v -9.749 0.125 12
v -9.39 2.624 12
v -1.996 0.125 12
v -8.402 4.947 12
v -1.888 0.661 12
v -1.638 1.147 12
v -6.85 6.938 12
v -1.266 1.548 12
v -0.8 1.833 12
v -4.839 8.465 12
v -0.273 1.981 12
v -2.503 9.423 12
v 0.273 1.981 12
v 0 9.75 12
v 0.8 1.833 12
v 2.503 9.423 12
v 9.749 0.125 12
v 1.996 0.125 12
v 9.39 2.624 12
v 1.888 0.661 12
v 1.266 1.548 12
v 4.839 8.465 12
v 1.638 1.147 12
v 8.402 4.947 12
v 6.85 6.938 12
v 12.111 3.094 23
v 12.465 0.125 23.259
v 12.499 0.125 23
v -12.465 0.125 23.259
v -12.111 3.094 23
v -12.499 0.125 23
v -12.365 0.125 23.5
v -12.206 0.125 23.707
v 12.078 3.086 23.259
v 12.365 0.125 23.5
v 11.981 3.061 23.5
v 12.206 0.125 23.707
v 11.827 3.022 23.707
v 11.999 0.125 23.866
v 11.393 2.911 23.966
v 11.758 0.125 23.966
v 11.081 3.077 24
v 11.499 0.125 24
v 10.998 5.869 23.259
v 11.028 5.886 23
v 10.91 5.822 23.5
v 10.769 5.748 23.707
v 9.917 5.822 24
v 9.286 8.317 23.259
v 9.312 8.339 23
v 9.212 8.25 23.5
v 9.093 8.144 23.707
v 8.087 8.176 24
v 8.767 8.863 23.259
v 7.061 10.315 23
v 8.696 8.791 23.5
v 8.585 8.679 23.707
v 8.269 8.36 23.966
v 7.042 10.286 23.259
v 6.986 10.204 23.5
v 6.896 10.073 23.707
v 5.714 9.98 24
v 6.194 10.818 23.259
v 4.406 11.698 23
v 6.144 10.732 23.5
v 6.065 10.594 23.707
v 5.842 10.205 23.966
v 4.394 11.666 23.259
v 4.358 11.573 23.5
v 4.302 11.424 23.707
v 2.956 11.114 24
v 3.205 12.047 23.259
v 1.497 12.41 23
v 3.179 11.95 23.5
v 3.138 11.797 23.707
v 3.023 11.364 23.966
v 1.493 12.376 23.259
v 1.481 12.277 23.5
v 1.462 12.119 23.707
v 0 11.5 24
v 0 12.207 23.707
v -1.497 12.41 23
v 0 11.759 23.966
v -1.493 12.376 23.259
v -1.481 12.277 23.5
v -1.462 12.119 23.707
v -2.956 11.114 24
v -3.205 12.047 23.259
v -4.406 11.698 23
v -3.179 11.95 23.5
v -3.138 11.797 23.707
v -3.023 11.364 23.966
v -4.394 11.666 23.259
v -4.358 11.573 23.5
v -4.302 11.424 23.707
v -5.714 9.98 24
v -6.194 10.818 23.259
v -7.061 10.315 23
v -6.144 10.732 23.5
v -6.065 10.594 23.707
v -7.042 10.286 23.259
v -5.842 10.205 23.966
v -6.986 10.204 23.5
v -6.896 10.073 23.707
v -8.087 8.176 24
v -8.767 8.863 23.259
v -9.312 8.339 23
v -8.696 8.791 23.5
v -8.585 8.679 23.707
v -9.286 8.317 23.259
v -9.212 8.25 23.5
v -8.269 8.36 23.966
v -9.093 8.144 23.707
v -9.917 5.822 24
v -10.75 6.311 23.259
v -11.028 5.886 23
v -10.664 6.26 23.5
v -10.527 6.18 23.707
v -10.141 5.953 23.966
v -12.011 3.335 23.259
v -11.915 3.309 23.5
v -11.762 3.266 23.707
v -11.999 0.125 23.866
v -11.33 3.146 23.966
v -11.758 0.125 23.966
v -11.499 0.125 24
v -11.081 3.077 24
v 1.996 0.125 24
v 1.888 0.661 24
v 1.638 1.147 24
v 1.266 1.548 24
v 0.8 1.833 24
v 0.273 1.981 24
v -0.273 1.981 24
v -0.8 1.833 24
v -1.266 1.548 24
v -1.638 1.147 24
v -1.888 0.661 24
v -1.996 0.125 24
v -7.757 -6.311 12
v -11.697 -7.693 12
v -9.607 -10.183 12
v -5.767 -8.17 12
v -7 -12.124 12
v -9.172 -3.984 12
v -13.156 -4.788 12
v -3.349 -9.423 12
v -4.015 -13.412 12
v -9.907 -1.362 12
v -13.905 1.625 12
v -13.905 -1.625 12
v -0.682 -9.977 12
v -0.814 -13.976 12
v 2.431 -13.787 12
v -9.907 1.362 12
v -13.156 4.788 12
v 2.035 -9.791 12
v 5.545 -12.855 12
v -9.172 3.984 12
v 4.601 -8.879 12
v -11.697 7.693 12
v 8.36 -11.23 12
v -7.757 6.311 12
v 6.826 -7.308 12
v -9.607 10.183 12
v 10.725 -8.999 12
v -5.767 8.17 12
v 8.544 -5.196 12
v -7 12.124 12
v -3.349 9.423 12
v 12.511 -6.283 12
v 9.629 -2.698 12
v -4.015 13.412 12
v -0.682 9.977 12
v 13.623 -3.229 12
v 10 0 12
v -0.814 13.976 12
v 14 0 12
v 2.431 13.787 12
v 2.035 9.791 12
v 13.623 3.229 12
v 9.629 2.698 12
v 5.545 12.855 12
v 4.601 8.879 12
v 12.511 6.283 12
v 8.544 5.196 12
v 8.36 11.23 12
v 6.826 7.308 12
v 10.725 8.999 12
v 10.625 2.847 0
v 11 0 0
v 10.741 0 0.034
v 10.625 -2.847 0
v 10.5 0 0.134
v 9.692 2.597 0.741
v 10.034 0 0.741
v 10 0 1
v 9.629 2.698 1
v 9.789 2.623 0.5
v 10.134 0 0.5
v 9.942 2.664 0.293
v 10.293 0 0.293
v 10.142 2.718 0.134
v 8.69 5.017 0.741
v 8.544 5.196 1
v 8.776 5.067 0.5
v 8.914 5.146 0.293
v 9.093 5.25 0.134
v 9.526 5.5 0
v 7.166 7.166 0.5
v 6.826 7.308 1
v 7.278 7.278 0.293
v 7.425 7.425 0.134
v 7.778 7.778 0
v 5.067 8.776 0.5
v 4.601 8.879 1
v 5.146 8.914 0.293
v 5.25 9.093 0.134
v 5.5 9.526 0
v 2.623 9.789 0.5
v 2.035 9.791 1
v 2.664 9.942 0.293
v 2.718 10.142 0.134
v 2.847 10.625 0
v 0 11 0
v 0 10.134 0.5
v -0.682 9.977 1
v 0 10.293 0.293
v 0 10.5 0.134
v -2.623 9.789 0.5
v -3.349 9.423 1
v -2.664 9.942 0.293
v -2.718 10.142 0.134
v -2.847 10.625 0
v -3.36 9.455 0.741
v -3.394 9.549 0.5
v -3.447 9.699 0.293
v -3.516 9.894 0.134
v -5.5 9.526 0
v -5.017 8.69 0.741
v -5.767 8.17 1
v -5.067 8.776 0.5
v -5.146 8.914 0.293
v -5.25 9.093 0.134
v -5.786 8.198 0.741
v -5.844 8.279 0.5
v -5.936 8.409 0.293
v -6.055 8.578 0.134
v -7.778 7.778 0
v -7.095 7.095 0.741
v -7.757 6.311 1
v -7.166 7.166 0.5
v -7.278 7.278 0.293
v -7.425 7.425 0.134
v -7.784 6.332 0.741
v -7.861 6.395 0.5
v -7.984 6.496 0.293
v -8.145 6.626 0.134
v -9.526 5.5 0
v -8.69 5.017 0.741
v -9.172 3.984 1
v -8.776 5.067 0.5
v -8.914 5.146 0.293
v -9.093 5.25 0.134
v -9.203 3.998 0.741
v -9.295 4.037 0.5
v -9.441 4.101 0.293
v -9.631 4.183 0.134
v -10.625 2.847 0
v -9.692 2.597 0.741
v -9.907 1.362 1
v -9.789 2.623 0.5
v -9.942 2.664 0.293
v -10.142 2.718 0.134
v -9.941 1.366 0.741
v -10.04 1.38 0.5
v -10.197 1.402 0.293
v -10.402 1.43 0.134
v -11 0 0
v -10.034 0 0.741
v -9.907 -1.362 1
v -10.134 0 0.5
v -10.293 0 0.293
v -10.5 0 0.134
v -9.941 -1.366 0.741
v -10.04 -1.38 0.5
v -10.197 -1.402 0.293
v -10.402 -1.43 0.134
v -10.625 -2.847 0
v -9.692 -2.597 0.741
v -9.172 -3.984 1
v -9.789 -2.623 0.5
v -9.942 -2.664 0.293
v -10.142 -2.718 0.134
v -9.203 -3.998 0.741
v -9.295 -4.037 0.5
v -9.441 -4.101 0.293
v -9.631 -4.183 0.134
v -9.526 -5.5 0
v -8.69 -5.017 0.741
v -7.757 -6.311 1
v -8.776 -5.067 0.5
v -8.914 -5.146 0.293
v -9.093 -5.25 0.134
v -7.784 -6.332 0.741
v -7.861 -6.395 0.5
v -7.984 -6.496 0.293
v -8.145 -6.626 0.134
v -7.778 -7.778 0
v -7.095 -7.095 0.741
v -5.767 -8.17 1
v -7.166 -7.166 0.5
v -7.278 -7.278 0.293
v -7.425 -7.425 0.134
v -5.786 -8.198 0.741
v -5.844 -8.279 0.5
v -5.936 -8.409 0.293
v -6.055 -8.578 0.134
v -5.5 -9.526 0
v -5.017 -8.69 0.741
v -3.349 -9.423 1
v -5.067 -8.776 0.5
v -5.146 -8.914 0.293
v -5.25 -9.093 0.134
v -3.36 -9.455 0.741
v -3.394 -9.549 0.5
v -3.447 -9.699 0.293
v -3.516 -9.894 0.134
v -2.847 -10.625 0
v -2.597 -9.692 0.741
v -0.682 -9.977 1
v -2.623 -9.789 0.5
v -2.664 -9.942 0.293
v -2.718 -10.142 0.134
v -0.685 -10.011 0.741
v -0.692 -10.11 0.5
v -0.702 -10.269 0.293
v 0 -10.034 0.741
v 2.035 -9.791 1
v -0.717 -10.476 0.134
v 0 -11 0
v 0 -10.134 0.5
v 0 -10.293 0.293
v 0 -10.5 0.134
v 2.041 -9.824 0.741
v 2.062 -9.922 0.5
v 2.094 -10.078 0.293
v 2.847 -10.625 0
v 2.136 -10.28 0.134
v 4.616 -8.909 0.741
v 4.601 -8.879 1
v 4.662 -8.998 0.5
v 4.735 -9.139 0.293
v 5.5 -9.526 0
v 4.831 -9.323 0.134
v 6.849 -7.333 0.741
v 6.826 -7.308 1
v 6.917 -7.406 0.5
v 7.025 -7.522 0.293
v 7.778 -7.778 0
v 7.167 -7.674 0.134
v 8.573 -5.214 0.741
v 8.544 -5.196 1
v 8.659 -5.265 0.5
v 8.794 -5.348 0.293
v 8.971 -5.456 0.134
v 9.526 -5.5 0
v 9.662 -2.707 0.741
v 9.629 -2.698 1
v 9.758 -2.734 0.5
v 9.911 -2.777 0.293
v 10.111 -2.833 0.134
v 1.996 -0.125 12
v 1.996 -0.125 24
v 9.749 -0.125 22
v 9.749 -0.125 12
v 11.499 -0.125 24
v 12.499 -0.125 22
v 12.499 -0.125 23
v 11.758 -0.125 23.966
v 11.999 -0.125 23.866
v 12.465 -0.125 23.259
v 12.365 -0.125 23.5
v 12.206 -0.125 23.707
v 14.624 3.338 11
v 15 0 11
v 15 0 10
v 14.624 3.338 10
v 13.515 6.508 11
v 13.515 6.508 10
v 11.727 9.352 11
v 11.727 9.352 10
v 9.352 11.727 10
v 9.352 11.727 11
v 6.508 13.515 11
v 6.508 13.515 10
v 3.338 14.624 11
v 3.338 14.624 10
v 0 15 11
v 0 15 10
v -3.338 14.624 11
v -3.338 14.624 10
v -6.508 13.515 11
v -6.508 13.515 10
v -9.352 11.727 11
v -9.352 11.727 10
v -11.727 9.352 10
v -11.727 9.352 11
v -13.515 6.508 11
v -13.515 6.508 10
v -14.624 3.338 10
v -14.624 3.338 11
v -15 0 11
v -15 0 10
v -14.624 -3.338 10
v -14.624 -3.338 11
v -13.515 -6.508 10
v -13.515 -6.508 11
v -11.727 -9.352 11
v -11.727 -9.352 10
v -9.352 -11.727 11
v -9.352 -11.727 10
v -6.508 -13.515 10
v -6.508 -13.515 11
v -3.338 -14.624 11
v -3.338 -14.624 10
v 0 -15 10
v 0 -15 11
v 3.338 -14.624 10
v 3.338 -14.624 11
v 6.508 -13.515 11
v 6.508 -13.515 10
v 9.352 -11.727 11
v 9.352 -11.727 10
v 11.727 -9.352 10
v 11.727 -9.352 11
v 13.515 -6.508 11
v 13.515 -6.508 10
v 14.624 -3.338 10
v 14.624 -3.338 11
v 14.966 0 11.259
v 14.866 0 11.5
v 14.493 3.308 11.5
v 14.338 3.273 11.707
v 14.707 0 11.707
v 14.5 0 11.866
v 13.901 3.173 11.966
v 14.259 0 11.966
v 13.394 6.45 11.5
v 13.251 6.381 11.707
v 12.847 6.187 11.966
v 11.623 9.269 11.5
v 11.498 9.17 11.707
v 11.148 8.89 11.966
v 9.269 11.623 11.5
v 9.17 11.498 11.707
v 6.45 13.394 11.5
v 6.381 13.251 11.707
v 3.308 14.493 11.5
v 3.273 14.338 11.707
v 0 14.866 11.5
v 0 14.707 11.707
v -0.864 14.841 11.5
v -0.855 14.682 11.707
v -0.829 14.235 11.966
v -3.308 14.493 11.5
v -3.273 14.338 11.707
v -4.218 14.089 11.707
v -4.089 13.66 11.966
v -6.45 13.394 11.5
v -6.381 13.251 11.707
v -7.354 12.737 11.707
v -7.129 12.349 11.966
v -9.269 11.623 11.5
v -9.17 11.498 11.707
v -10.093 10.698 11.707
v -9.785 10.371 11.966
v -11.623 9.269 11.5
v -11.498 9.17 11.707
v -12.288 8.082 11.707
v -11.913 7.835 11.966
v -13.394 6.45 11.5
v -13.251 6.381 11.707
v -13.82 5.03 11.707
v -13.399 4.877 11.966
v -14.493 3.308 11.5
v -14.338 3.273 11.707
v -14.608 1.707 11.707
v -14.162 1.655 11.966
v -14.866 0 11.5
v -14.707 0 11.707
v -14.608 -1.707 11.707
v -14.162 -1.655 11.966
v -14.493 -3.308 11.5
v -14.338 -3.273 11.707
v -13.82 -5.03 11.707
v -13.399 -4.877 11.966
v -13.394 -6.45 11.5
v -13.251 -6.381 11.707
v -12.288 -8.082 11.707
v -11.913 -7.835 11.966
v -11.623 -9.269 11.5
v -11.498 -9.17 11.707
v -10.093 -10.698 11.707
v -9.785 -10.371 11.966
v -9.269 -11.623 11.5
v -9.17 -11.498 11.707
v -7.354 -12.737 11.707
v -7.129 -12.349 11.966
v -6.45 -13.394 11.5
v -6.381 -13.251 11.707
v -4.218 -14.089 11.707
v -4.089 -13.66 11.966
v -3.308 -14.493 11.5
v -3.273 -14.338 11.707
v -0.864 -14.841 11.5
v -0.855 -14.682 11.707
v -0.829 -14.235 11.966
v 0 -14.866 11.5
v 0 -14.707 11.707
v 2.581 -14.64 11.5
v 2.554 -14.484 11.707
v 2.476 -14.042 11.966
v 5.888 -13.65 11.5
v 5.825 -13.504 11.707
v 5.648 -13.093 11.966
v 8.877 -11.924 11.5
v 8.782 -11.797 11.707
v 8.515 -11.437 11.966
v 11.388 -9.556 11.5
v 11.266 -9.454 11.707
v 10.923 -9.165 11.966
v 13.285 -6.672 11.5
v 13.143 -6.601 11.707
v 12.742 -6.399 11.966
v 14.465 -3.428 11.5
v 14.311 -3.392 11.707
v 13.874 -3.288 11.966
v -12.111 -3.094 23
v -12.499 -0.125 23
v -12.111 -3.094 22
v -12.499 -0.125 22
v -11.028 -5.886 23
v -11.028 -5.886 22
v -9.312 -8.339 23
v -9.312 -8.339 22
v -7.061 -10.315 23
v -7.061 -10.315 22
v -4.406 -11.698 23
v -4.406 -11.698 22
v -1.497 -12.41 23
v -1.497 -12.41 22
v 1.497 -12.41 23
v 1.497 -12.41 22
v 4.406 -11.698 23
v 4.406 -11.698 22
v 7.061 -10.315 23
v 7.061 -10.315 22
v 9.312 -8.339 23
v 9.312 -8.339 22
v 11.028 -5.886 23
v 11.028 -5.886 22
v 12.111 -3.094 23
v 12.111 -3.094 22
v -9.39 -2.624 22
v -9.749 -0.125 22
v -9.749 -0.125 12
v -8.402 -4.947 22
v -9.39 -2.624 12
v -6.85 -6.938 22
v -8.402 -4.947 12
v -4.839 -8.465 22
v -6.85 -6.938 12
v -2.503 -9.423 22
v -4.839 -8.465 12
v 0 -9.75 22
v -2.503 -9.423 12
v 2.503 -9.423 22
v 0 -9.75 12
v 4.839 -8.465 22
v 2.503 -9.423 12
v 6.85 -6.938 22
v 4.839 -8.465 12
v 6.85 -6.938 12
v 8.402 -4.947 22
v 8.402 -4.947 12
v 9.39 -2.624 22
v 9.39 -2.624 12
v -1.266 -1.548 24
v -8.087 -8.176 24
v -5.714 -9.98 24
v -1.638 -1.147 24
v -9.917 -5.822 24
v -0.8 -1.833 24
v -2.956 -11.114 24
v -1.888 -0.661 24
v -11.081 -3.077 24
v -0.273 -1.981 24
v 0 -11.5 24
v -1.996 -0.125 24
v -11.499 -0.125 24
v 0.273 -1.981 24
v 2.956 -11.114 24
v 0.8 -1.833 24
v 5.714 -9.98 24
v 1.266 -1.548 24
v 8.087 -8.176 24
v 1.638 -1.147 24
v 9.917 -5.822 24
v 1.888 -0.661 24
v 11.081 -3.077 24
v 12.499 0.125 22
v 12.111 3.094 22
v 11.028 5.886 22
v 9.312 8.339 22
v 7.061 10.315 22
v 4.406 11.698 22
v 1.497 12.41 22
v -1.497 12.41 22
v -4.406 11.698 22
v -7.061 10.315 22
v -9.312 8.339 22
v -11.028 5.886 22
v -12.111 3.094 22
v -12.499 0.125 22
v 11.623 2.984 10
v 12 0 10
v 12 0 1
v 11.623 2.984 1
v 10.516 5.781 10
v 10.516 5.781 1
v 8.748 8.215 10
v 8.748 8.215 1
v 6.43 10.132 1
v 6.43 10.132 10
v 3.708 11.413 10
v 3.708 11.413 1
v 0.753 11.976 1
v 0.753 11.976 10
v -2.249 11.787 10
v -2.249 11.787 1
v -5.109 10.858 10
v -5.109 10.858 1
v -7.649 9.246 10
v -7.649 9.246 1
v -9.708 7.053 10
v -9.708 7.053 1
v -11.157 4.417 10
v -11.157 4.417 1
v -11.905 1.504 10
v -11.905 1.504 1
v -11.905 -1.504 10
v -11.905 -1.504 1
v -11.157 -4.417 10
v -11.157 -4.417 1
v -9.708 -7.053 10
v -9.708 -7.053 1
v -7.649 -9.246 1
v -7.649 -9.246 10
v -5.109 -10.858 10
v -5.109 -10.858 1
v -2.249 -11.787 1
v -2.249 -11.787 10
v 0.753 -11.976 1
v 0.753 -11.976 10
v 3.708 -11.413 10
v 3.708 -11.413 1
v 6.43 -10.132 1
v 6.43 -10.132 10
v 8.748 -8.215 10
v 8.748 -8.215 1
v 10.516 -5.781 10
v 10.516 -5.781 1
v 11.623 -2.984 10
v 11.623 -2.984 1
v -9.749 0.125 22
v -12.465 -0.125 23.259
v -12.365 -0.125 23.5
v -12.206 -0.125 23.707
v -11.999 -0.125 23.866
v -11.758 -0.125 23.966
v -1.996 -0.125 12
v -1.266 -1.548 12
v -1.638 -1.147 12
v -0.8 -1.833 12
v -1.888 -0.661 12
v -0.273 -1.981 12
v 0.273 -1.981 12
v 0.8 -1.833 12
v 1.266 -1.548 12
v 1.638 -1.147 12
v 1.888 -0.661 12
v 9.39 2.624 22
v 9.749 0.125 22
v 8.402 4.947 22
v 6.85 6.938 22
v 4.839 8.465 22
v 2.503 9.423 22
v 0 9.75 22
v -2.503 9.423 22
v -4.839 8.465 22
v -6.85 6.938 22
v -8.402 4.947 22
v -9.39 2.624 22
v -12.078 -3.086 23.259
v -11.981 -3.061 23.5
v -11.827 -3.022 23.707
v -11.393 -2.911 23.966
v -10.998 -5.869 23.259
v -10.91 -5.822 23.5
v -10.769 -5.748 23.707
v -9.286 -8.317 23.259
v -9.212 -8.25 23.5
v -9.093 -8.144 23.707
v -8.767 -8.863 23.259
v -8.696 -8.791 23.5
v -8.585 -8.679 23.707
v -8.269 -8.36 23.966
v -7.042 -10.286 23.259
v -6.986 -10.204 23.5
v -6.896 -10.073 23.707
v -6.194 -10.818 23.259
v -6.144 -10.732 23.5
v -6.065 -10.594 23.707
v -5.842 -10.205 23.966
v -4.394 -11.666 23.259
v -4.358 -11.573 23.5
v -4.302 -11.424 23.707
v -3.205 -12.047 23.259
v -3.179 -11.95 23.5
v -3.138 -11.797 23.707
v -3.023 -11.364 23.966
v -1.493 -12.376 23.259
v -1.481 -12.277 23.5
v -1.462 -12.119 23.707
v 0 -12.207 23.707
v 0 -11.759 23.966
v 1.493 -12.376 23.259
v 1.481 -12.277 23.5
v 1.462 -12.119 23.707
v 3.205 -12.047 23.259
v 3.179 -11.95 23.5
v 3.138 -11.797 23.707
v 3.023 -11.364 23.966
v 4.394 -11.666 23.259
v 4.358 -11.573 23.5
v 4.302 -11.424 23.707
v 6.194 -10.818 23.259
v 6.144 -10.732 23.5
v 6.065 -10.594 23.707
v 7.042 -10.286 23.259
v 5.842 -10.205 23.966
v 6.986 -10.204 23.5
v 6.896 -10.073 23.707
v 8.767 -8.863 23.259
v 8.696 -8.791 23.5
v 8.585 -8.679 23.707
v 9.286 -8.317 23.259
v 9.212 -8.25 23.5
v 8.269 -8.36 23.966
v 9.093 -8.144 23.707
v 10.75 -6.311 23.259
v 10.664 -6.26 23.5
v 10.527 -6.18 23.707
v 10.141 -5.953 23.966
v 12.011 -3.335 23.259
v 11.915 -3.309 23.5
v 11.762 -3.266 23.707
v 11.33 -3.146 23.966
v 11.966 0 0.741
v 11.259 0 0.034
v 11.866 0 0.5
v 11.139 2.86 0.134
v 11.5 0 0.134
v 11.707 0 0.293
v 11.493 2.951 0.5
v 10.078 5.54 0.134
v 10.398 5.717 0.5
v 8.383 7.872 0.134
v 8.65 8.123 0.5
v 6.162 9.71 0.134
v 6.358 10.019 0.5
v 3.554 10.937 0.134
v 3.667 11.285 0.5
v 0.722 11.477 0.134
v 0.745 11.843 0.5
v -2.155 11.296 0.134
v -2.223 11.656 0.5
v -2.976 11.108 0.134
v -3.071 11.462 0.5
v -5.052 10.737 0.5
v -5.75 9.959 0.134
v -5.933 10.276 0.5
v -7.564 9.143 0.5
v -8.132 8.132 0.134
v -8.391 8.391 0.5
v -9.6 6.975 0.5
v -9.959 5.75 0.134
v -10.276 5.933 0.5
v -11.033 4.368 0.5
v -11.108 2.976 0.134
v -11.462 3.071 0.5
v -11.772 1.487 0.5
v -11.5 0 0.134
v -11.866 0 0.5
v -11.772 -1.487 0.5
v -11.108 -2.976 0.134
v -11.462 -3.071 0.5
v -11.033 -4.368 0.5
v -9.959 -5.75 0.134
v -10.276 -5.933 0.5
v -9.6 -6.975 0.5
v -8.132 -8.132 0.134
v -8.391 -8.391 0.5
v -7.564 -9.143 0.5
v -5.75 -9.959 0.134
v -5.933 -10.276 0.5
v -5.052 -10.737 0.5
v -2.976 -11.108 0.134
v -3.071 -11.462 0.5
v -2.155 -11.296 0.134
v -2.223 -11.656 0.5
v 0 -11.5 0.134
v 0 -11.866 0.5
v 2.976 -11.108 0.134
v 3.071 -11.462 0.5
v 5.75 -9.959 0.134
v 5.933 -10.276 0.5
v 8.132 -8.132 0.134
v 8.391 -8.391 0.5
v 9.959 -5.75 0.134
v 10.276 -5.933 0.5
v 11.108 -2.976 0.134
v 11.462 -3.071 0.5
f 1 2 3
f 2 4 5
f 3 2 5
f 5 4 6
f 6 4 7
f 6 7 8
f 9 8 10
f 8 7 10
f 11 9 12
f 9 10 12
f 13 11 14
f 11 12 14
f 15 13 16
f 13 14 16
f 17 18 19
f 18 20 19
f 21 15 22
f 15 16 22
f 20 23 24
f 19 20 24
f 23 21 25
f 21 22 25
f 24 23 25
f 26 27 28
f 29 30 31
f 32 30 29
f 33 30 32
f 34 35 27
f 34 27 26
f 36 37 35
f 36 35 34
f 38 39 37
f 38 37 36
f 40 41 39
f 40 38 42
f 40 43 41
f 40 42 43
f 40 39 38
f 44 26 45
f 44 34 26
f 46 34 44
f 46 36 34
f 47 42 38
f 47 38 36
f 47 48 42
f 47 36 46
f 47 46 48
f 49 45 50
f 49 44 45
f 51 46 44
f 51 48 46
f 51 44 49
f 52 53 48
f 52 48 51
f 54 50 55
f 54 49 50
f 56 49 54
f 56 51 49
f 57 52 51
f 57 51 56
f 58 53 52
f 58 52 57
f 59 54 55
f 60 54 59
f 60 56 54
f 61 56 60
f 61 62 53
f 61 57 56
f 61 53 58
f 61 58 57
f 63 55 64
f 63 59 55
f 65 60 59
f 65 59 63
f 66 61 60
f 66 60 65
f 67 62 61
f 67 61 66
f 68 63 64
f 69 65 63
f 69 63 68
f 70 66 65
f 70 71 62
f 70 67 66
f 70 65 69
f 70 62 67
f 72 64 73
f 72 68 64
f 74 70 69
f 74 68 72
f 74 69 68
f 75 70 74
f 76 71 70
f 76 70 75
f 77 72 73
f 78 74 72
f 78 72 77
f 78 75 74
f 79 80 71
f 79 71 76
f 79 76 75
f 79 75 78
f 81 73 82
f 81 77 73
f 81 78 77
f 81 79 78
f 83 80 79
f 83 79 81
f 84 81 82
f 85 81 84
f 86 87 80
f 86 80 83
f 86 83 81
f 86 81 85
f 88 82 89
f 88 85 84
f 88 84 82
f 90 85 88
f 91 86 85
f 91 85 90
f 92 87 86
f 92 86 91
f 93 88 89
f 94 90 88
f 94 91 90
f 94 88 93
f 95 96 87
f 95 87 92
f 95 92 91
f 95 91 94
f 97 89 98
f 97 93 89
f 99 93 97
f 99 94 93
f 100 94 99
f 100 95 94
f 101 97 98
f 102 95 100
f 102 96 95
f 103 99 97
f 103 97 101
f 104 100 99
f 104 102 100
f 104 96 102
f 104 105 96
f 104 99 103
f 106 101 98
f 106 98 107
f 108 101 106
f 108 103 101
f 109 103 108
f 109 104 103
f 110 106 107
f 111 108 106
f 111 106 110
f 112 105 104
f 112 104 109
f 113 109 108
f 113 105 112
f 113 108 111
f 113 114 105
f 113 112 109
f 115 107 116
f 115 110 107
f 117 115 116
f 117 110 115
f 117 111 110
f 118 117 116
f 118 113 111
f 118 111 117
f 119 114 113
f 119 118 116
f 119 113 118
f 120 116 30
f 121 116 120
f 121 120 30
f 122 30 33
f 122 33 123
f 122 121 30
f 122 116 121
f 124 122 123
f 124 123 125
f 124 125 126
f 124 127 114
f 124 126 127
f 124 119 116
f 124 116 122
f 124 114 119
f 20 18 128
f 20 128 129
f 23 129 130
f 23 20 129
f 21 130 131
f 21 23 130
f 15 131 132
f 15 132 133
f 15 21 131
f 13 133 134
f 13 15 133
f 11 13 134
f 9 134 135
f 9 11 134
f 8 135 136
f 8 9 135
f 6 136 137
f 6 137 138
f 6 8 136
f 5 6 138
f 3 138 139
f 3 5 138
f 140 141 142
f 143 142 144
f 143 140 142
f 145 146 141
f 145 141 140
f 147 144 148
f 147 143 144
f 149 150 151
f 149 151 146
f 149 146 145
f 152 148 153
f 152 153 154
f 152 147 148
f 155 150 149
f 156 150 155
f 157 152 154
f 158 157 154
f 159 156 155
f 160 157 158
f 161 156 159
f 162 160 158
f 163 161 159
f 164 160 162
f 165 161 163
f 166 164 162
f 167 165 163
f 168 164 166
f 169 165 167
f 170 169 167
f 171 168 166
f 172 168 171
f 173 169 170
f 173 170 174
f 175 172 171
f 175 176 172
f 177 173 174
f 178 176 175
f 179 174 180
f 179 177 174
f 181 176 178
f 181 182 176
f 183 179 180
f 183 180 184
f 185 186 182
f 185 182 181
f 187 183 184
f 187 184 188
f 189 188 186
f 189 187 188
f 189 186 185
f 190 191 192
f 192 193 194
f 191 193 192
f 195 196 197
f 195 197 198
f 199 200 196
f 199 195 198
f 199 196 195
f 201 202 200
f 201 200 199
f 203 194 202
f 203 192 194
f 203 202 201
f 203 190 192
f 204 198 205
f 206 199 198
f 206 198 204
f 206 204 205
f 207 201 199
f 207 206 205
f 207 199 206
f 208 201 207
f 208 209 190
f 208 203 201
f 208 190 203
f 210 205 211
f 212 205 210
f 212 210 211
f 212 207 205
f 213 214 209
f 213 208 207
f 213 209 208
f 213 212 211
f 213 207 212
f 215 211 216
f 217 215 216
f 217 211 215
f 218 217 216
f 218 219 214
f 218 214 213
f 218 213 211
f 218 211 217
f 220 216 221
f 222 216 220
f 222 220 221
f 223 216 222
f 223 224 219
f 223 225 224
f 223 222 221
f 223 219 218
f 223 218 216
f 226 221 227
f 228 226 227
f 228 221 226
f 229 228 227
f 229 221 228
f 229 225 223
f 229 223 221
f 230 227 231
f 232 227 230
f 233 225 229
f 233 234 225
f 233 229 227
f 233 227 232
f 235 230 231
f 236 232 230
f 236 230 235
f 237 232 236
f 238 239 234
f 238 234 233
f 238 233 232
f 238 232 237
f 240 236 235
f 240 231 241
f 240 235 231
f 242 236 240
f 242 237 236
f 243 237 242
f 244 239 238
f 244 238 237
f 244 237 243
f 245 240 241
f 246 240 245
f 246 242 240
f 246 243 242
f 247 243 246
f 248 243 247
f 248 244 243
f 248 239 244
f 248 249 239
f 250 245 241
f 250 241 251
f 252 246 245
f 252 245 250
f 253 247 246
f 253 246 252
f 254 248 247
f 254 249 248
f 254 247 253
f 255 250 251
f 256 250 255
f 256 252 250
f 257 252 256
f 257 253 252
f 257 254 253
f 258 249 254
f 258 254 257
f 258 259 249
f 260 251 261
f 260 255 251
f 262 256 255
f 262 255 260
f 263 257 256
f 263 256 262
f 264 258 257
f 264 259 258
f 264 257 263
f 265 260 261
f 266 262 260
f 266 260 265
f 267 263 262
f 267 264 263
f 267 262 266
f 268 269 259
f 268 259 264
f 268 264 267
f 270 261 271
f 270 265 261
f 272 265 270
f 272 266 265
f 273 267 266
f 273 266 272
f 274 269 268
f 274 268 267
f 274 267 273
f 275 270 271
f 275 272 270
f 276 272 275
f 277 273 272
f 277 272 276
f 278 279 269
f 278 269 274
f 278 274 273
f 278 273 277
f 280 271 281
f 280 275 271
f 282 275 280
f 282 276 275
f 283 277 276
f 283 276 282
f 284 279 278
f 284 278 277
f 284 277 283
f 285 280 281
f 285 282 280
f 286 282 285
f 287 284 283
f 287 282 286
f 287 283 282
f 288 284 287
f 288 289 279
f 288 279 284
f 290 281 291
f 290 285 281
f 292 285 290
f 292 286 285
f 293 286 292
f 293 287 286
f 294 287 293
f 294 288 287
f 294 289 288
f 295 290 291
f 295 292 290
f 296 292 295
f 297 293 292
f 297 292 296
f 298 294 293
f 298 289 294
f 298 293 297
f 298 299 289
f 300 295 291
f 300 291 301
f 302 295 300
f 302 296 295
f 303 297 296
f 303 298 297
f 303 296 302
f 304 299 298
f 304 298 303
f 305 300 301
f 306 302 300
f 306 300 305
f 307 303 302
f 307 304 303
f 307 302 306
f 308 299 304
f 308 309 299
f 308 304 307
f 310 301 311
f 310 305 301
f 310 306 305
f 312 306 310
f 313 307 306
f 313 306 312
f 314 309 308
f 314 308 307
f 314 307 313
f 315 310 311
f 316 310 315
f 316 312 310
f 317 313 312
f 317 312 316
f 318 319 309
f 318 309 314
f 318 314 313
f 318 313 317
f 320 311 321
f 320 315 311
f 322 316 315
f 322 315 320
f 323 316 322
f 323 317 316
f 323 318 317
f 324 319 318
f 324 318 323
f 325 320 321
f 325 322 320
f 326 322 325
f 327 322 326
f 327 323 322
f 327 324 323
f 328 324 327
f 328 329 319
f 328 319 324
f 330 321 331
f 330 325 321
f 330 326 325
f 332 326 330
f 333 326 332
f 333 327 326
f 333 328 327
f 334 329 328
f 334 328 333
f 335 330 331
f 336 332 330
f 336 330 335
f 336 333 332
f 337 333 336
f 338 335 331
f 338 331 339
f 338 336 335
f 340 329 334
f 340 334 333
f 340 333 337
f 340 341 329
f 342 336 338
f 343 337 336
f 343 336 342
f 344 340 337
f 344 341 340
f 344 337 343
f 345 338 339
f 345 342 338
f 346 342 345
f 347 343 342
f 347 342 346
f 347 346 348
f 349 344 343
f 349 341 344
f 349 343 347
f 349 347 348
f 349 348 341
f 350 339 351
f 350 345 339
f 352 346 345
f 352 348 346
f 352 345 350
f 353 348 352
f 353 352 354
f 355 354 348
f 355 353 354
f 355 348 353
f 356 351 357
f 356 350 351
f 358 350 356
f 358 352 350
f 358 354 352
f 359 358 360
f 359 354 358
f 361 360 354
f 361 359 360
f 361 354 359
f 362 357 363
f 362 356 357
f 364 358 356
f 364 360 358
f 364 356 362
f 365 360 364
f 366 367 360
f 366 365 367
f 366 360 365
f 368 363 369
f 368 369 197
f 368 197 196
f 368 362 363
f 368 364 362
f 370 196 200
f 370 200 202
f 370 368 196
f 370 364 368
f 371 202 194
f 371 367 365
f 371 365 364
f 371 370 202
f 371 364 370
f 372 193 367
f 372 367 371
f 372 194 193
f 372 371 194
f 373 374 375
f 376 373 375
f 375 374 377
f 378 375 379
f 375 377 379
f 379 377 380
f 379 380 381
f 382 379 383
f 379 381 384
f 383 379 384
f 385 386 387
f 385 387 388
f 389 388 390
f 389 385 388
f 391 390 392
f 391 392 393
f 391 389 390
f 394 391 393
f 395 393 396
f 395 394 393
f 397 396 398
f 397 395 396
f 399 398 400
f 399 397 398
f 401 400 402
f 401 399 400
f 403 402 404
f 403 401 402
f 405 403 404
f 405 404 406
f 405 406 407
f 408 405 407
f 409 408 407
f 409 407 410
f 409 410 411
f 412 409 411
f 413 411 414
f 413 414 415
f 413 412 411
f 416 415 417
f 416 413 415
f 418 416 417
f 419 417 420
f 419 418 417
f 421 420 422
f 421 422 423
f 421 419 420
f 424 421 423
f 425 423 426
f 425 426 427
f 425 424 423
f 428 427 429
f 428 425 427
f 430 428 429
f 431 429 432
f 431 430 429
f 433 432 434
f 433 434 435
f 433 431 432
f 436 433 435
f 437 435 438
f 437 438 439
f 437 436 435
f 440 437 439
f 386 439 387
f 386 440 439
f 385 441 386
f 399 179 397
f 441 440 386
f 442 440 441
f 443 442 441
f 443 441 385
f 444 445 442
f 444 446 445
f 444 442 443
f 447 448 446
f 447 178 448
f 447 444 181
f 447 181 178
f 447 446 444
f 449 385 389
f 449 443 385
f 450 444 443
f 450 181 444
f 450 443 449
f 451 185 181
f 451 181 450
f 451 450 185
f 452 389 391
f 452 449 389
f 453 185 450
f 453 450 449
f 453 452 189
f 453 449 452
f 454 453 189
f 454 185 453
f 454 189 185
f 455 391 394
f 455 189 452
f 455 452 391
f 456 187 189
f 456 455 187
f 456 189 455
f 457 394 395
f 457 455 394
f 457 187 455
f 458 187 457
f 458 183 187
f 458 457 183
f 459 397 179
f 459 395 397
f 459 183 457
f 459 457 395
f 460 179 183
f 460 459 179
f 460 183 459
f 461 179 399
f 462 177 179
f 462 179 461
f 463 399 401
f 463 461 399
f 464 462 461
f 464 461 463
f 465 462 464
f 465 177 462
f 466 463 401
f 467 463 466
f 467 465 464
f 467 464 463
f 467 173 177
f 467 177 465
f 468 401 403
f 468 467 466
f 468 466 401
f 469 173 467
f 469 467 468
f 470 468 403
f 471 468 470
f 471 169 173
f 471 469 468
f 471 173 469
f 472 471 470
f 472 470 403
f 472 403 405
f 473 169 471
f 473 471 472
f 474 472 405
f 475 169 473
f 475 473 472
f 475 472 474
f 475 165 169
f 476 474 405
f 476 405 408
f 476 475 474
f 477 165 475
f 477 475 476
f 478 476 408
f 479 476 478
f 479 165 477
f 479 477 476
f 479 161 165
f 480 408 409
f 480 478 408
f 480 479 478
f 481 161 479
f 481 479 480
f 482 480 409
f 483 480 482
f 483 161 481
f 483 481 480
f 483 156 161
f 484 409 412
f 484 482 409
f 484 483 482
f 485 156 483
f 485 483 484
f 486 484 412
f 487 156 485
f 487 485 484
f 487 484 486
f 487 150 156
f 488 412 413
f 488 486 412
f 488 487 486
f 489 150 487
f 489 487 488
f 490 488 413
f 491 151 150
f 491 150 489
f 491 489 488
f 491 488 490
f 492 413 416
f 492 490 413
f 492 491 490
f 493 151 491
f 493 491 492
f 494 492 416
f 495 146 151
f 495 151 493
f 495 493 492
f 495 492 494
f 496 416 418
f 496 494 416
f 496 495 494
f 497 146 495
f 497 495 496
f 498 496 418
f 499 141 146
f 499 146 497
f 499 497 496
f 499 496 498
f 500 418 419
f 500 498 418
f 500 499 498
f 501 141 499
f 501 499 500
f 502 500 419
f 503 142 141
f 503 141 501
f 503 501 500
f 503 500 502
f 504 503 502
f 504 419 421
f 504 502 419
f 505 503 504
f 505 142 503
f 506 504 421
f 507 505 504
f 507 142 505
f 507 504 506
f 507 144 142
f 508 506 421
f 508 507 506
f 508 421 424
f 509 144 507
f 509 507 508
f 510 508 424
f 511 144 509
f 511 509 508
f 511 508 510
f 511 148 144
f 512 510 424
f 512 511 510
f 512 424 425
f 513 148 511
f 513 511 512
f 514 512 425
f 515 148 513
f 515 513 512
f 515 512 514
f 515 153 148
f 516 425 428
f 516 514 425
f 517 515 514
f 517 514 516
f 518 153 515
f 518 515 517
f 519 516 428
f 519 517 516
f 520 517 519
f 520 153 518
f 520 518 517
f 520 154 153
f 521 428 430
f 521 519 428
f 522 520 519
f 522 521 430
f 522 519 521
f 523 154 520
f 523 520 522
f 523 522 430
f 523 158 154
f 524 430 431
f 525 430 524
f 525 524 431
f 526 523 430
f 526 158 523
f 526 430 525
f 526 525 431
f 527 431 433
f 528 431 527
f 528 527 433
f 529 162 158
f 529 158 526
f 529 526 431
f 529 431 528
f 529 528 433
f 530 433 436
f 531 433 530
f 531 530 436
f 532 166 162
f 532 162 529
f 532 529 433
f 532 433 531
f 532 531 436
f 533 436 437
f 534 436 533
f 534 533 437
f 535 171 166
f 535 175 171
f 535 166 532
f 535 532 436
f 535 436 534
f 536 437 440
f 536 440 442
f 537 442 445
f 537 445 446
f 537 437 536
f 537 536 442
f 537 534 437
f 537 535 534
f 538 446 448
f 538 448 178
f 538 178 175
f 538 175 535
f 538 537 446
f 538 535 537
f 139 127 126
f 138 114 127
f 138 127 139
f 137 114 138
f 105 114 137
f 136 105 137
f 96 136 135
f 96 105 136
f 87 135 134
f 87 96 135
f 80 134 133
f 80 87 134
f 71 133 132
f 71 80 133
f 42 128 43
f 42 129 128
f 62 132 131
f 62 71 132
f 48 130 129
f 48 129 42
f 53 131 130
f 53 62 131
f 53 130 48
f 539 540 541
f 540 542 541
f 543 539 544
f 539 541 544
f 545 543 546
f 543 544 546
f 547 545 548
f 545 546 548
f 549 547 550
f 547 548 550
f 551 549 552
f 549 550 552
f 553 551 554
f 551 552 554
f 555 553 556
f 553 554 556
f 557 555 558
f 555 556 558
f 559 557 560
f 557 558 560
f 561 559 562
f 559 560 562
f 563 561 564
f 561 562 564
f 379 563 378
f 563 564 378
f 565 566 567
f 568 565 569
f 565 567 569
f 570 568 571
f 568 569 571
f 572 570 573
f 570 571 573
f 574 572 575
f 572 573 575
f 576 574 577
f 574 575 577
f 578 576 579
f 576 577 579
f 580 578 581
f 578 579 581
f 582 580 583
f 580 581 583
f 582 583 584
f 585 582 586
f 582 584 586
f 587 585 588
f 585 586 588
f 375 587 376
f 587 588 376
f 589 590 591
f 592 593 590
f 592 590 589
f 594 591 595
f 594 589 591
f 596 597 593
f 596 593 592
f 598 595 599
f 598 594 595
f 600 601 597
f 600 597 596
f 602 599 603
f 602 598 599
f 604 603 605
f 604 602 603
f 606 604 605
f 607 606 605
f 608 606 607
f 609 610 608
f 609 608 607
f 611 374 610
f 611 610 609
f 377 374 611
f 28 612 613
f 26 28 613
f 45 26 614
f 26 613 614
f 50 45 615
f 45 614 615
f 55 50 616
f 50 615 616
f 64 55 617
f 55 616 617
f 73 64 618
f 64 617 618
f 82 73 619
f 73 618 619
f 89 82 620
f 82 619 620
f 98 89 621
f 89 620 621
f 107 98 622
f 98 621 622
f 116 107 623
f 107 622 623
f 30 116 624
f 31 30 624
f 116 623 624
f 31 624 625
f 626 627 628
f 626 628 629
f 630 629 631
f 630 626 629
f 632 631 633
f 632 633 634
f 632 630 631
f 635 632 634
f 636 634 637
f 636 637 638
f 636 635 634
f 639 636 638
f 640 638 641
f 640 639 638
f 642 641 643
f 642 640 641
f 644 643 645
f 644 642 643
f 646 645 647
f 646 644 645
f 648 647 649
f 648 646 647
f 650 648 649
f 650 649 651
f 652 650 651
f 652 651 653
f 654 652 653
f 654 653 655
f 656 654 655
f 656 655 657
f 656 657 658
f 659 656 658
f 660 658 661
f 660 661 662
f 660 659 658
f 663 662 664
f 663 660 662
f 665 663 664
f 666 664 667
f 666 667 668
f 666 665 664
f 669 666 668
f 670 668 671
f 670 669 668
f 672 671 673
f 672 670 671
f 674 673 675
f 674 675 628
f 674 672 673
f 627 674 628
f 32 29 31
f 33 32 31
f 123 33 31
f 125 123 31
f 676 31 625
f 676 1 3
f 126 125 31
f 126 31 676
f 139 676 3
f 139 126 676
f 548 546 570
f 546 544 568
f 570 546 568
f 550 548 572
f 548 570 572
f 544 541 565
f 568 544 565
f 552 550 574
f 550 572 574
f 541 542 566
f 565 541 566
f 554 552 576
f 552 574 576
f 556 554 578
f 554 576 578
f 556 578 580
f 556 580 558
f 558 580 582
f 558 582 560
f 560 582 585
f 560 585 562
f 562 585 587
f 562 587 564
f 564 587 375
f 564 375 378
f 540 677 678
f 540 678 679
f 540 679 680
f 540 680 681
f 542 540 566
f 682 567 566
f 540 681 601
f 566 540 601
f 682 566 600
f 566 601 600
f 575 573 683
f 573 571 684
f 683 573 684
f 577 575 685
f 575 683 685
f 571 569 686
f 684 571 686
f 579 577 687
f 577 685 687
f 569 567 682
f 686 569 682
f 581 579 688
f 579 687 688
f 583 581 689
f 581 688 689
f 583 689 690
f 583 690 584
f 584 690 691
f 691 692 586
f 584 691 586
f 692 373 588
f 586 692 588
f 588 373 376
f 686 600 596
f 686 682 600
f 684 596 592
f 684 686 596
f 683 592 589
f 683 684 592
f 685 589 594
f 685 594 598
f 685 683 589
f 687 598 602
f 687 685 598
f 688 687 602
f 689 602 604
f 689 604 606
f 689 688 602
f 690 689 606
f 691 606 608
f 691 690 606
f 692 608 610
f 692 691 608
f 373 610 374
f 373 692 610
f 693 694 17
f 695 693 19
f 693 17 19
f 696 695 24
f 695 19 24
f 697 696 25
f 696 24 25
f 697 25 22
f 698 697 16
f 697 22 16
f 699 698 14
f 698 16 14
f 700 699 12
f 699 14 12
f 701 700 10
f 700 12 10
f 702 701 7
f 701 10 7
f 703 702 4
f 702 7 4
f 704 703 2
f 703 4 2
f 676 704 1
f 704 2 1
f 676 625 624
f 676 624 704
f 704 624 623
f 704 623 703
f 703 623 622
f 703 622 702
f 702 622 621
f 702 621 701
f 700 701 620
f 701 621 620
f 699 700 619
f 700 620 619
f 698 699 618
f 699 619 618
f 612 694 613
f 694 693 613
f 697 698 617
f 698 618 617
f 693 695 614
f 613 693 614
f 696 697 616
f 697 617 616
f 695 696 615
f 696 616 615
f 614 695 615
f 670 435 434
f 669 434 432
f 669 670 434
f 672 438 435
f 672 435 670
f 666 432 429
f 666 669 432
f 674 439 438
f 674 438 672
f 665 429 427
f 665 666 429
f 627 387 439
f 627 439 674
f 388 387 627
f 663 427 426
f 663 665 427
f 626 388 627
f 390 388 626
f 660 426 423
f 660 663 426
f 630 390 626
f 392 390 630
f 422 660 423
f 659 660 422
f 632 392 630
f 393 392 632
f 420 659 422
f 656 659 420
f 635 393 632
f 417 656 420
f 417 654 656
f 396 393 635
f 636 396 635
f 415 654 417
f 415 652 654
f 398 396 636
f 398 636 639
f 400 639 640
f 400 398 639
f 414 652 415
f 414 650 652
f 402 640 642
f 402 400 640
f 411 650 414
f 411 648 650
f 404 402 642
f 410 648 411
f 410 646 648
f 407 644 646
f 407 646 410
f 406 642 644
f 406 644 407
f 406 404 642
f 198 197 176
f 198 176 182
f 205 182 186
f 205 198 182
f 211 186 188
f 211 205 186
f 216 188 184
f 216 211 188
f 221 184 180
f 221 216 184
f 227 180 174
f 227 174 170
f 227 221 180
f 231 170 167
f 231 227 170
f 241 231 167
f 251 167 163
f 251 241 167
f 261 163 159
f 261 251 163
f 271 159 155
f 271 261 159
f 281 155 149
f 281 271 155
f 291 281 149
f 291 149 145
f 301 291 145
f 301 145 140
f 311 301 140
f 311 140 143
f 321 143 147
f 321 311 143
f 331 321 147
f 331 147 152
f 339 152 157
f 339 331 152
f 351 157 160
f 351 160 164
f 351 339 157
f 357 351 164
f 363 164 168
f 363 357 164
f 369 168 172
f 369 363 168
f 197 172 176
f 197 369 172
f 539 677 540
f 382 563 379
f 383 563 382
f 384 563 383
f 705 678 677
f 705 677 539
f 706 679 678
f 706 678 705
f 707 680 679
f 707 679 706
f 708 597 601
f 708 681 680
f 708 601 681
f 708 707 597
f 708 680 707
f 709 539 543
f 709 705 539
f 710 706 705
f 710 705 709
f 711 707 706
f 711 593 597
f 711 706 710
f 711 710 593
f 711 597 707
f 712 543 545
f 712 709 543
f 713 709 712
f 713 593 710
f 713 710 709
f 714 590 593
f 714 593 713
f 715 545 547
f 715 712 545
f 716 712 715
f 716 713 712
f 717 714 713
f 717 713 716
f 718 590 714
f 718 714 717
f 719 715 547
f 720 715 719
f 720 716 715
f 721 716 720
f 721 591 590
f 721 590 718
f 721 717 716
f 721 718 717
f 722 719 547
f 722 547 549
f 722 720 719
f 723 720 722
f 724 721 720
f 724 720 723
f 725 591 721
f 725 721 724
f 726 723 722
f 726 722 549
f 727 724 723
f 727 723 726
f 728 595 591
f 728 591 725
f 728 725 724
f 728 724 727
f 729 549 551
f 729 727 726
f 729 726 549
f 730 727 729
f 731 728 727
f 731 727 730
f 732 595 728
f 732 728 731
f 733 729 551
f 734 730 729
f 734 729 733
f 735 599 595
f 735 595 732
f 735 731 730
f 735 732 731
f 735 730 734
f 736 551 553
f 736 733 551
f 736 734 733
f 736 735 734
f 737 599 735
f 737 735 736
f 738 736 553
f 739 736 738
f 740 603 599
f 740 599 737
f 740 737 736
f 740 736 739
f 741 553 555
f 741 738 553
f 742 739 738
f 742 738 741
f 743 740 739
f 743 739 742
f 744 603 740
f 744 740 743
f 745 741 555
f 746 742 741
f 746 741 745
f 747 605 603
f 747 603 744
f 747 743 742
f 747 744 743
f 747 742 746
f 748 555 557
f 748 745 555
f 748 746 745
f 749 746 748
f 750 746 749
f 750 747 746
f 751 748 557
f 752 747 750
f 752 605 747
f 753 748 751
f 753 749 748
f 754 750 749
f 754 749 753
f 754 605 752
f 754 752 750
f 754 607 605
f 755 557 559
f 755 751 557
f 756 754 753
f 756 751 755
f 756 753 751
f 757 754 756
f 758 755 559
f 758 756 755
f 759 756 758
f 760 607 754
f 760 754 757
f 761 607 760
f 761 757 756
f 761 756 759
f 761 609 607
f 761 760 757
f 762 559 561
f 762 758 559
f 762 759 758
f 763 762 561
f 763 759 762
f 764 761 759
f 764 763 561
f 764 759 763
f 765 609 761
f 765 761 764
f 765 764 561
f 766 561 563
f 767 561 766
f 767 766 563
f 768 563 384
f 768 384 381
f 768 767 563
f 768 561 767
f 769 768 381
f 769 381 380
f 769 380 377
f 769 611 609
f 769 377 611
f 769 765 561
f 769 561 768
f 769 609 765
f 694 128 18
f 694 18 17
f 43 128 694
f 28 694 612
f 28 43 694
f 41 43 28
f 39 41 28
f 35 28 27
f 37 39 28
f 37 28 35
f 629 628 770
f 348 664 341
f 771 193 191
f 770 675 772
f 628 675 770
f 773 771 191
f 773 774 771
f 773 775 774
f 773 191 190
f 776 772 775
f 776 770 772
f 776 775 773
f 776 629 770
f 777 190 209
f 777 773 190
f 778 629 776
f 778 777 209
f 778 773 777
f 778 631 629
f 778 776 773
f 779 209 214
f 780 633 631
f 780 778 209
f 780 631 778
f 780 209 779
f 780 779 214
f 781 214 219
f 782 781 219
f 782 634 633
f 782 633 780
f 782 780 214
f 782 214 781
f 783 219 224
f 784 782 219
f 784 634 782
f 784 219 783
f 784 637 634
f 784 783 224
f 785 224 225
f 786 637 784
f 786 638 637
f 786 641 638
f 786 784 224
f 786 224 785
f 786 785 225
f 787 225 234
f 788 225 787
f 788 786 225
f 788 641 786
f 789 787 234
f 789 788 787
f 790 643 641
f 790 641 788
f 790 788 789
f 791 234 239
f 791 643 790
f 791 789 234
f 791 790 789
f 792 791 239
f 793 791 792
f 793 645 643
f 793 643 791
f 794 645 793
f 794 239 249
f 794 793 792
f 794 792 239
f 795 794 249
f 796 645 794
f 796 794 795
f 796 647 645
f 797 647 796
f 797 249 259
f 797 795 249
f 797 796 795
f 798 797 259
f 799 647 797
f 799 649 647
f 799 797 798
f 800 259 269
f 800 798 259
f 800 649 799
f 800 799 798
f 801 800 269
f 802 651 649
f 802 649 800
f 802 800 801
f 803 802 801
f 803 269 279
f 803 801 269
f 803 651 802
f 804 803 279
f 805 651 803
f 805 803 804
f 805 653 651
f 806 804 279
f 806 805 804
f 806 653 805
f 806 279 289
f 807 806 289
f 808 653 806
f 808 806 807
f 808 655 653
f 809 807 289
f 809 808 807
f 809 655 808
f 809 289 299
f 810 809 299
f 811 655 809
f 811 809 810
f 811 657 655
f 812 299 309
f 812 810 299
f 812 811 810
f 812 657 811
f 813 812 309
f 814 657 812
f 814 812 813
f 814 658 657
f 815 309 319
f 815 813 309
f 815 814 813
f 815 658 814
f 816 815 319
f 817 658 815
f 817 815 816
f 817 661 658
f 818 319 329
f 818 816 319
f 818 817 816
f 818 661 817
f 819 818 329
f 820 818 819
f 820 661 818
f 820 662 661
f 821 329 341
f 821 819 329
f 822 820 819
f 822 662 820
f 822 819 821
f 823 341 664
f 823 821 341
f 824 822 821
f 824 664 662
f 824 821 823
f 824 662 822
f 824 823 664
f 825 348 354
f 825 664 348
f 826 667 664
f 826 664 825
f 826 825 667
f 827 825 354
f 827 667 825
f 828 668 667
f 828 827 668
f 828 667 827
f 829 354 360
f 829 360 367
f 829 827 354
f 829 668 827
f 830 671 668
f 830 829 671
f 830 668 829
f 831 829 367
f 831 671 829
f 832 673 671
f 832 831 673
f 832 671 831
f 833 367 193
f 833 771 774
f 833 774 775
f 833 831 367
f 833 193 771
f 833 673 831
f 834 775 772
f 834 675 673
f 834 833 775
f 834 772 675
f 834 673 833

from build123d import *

# Parameters (mm, degrees)
F2_R     = 0.99999
F3_R     = 9.75
F3_R_2   = 2
F4_DEPTH = 10
F5_R     = 12.5
F5_R_2   = 2
F6_DEPTH = 2
F7_R     = 1
F8_W     = 25
F8_H     = 0.25
F9_DEPTH = 12


# Not quite as in the source:
# - a fillet or chamfer is up to 0.001 mm smaller than in the source, because OpenCascade refuses the exact size
# - a feature names something its author has since deleted; it is built from what else it names


with BuildPart() as f1:
    # F0 (on Front) → F1 (revolve)
    with BuildSketch(Plane.XZ):
        Polygon((10, 12), (10, 0), (12, 0), (12, 10), (15, 10), (15, 12), align=None)
    revolve(axis=Axis((0, 0, 14.2161818221), (0, 0, 1)))

    # F2 (radius 1 in the source; OpenCascade refuses exactly that, so slightly less here)
    f2_edges = [f1.edges().sort_by_distance(p)[0] for p in [
        (-10, 0, 0),
        (-12, 0, 0),
        (-15, 0, 12),
    ]]
    fillet(f2_edges, radius=F2_R)


with BuildPart() as f4:
    # F3 (on face) → F4 (new body)
    with BuildSketch(Plane.XY.offset(12)):
        Circle(F3_R)
        Circle(F3_R_2, mode=Mode.SUBTRACT)
    extrude(amount=F4_DEPTH)

    # F5 (on face) → F6 (join)
    with BuildSketch(Plane.XY.offset(22)):
        Circle(F5_R)
        Circle(F5_R_2, mode=Mode.SUBTRACT)
    extrude(amount=F6_DEPTH)

    # F7
    f7_edges = [f4.edges().sort_by_distance(p)[0] for p in [
        (-12.5, 0, 24),
    ]]
    fillet(f7_edges, radius=F7_R)

    # F8 (on face) → F9 (cut, through all)
    with BuildSketch(Plane.XY.offset(24)):
        Rectangle(F8_W, F8_H)
    extrude(amount=-F9_DEPTH, mode=Mode.SUBTRACT)


solid = Compound([f1.part, f4.part])
